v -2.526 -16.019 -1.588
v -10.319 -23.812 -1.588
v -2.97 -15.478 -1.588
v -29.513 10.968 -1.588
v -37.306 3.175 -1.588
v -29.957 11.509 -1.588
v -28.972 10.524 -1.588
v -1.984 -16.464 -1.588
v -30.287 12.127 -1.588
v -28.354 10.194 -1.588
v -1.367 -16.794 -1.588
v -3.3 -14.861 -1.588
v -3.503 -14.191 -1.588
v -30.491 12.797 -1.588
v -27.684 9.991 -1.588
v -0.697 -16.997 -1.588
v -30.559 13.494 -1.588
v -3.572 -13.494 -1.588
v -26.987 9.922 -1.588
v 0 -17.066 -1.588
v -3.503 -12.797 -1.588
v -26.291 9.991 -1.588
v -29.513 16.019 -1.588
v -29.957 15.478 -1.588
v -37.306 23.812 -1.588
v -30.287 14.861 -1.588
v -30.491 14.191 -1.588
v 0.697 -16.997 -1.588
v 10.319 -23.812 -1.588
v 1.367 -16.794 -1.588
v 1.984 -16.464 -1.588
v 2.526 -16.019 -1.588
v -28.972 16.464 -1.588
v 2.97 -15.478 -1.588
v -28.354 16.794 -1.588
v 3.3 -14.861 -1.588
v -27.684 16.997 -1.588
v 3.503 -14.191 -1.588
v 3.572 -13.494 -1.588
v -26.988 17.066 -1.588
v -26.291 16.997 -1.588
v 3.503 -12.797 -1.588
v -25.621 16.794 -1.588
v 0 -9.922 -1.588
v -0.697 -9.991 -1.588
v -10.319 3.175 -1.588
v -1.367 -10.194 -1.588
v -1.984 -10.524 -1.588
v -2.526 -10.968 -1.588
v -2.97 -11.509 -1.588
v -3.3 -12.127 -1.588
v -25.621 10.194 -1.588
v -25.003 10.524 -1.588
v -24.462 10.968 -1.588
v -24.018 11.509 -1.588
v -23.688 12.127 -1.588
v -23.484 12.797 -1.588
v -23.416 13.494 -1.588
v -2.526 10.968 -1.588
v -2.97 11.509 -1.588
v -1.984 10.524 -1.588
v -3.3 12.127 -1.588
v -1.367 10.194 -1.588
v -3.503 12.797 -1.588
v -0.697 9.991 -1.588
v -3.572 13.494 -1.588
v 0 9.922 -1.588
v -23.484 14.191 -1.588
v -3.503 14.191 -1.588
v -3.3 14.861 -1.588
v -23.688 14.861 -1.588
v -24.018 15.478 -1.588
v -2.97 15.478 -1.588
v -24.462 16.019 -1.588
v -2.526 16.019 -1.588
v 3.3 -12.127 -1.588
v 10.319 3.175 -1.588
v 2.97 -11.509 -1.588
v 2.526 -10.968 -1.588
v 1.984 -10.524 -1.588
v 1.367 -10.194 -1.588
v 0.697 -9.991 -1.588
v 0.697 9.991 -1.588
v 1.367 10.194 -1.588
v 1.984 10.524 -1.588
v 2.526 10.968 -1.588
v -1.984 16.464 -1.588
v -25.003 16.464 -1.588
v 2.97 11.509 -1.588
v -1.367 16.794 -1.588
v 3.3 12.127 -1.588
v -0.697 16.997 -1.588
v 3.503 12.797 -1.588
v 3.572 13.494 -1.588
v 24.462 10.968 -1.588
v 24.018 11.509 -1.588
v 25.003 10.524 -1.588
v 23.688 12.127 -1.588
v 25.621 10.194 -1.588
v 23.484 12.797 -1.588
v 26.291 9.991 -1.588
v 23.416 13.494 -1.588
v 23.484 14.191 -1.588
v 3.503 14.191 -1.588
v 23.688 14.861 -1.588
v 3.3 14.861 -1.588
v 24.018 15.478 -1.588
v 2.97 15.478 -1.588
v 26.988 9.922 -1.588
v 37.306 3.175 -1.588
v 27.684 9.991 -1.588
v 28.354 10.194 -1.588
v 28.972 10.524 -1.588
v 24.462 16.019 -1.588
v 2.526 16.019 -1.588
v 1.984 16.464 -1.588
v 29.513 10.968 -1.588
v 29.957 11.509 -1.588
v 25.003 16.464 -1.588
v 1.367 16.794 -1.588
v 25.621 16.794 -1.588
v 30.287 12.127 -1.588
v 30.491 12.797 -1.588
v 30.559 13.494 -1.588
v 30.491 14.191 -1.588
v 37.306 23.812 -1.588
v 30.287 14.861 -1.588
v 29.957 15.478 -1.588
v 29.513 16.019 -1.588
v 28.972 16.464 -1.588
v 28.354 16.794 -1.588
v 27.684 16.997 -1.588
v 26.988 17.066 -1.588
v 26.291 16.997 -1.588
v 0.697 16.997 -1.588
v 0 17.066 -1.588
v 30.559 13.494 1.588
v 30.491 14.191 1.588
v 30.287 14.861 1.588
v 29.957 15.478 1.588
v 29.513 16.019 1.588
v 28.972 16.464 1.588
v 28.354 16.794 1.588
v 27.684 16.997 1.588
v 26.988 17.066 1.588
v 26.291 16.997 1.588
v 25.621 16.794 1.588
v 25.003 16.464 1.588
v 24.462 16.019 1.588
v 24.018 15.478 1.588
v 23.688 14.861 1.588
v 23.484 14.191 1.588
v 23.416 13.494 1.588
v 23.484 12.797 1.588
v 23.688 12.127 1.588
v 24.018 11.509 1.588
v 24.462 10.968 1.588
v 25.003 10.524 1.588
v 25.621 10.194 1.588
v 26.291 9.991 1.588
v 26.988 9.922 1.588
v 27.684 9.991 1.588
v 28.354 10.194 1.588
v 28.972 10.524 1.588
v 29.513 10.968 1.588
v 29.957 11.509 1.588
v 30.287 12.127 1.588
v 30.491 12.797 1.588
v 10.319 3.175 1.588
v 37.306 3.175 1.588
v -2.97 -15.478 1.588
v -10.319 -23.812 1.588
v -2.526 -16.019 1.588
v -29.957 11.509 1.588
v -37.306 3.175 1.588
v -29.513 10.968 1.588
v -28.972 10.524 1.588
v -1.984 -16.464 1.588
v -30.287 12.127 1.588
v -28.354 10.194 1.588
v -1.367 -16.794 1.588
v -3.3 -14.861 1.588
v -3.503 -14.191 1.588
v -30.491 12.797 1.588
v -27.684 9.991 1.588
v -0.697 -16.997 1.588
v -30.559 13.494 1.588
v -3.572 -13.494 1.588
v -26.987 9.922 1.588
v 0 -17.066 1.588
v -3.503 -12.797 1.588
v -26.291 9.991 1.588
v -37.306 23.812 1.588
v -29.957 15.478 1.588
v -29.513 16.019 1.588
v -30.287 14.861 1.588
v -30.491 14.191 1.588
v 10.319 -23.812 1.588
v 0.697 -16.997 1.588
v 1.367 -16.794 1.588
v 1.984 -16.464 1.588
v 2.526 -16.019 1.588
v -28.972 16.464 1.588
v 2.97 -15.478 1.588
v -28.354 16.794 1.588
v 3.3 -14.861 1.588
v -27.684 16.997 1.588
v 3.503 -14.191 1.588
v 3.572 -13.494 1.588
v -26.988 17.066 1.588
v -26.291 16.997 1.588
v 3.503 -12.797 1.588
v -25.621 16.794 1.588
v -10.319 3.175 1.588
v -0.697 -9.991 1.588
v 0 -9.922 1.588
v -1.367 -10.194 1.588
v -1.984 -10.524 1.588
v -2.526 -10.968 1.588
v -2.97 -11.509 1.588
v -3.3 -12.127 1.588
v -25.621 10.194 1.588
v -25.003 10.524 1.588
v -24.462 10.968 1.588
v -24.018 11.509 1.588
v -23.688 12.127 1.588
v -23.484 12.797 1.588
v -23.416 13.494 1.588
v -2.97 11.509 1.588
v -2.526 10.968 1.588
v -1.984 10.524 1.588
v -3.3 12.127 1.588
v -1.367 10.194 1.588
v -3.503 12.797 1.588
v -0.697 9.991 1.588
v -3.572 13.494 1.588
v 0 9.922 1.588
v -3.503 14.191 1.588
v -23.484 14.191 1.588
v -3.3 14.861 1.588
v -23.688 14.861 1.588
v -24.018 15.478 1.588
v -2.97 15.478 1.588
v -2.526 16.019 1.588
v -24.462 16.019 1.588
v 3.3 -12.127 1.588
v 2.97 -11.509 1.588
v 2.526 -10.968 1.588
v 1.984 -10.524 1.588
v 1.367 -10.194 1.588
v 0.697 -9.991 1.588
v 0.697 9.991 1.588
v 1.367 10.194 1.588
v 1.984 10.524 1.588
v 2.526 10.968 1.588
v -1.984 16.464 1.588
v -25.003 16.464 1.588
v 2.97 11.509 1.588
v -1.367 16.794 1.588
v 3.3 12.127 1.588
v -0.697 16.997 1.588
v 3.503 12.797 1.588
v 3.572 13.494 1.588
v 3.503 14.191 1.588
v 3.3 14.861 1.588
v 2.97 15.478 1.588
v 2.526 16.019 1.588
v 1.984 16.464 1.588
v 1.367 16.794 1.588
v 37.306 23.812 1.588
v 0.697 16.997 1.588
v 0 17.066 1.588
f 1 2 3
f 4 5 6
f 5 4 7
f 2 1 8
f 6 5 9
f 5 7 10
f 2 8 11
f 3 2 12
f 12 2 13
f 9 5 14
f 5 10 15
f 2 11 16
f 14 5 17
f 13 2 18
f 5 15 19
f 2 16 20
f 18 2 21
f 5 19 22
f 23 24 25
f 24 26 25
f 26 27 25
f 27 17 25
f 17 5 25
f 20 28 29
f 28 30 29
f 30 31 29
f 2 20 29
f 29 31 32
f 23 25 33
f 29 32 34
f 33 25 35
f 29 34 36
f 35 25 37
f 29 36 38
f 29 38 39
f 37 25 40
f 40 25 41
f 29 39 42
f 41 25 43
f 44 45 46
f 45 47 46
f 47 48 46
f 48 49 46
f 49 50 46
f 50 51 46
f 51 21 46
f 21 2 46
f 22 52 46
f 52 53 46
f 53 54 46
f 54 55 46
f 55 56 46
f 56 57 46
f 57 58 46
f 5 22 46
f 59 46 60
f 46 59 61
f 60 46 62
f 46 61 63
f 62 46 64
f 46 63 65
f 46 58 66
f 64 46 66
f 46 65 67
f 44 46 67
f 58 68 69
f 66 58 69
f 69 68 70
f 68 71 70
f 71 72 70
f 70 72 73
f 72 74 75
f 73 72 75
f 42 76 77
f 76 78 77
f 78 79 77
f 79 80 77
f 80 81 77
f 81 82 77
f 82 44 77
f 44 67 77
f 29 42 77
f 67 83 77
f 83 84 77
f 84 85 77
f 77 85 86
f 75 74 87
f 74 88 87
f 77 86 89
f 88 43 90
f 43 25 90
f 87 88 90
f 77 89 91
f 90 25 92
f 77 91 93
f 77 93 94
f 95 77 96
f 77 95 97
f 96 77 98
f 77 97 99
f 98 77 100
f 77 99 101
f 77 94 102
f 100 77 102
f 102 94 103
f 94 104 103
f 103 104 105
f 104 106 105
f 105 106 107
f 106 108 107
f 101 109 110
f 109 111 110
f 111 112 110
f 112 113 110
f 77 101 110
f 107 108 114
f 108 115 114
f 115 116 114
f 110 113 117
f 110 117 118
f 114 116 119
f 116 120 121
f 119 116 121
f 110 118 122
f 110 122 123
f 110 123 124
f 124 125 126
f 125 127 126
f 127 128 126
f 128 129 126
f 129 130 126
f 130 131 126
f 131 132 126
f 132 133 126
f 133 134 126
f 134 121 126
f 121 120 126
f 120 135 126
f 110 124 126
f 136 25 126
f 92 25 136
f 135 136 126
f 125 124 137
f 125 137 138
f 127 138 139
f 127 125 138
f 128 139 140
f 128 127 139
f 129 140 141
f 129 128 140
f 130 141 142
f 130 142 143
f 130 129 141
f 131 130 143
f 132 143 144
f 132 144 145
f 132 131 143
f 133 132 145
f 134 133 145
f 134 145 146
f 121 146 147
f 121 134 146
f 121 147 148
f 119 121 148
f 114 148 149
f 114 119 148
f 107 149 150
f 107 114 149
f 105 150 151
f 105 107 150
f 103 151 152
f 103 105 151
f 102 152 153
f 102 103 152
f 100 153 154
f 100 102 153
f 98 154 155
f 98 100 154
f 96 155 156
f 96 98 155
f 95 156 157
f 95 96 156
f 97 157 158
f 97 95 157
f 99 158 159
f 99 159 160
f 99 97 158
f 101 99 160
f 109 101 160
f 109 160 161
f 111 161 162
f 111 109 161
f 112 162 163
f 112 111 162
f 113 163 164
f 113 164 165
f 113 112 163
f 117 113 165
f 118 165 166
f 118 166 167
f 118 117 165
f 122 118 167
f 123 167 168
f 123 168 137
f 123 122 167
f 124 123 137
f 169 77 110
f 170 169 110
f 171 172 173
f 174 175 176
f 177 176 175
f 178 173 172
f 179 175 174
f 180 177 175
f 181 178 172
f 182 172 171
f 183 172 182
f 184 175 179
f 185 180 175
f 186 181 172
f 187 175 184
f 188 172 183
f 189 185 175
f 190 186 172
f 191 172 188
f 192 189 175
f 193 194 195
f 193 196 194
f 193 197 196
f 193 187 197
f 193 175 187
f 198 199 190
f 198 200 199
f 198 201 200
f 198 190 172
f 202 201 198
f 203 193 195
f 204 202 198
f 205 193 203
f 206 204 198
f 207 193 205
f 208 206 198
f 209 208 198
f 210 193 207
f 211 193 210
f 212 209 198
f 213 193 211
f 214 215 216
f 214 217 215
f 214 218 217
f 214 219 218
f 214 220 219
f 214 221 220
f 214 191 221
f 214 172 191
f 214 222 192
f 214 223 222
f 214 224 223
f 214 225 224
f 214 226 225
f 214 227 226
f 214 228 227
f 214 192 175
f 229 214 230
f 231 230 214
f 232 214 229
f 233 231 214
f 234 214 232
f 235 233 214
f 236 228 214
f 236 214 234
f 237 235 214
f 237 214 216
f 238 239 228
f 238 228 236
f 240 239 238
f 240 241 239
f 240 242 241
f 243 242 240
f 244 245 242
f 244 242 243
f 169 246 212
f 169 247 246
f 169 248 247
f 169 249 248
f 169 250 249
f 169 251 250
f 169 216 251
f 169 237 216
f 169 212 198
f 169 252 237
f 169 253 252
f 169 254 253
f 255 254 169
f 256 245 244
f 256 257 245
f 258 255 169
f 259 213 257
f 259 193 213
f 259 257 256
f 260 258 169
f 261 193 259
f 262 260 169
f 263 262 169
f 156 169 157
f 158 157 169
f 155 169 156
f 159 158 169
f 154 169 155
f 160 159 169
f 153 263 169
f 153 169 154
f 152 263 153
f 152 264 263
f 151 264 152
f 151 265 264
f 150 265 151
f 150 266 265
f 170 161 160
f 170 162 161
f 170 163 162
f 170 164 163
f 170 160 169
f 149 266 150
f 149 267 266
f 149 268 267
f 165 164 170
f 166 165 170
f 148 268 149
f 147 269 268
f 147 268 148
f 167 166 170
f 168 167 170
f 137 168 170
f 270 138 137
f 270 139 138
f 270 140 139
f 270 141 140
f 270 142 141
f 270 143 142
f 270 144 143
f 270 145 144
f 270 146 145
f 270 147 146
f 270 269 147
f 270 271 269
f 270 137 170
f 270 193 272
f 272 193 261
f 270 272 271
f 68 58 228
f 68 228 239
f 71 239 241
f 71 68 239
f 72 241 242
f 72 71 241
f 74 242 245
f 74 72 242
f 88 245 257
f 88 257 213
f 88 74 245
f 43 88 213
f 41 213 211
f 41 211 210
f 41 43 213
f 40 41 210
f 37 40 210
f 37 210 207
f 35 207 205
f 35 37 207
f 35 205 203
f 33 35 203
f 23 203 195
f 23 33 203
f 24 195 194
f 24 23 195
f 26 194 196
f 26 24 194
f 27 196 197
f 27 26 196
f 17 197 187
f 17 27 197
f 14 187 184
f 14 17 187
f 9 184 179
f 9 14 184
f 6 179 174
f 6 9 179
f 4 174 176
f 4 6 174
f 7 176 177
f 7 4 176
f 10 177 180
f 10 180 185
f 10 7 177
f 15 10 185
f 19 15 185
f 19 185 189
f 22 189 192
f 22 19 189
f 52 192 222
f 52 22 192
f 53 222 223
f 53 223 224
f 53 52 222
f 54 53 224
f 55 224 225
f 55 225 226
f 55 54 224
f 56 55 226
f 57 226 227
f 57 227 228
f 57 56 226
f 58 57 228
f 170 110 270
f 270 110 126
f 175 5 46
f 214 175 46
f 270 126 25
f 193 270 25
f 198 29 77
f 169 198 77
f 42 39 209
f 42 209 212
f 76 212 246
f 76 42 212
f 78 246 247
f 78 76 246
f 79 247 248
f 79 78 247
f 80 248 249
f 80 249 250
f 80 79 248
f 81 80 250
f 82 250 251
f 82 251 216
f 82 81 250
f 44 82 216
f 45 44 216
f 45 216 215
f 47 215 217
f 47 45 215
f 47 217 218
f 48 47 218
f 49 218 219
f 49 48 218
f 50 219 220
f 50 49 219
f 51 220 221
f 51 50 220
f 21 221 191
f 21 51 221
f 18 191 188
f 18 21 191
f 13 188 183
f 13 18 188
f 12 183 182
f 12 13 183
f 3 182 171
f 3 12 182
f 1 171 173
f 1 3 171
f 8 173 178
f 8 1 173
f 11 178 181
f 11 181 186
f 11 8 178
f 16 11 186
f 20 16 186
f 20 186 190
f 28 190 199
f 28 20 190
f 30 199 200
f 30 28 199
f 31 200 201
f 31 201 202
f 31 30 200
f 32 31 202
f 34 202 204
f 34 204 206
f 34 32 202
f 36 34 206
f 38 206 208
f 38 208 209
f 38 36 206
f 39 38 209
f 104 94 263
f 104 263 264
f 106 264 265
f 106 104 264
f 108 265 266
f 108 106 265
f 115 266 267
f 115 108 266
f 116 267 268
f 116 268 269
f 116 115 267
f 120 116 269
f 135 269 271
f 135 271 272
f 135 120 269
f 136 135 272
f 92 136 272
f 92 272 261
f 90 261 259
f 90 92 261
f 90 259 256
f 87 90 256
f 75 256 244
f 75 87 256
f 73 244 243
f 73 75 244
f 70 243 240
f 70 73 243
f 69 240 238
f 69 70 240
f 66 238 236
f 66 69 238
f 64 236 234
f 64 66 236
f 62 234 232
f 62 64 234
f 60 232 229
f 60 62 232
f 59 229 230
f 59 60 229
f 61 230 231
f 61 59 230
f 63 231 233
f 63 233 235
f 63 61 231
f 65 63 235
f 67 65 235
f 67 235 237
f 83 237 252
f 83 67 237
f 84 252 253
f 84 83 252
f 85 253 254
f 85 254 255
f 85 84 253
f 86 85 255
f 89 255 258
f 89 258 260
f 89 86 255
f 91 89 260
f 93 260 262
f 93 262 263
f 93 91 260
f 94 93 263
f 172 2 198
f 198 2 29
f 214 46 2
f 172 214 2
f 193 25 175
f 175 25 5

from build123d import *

# Parameters (mm, degrees)
BOSS_EXTRUDE1_DEPTH      = 1.5875
BOSS_EXTRUDE1_DEPTH_BACK = 1.5875
SKETCH3_R                = 3.571875


with BuildPart() as part:
    # Sketch3 → Boss-Extrude1 (new, two sides: drawn at the far end of the back side and taken through both)
    with BuildSketch(Plane.XY.offset(-BOSS_EXTRUDE1_DEPTH_BACK)):
        Polygon((-10.31875, -23.8125), (10.31875, -23.8125), (10.31875, 3.175), (37.30625, 3.175), (37.30625, 23.8125), (-37.30625, 23.8125), (-37.30625, 3.175), (-10.31875, 3.175), align=None)
        with Locations((26.9875, 13.49375)):
            Circle(SKETCH3_R, mode=Mode.SUBTRACT)
        with Locations((0, -13.49375)):
            Circle(SKETCH3_R, mode=Mode.SUBTRACT)
        with Locations((-26.9875, 13.49375)):
            Circle(SKETCH3_R, mode=Mode.SUBTRACT)
        with Locations((0, 13.49375)):
            Circle(SKETCH3_R, mode=Mode.SUBTRACT)
    extrude(amount=BOSS_EXTRUDE1_DEPTH + BOSS_EXTRUDE1_DEPTH_BACK)


solid = part.part
